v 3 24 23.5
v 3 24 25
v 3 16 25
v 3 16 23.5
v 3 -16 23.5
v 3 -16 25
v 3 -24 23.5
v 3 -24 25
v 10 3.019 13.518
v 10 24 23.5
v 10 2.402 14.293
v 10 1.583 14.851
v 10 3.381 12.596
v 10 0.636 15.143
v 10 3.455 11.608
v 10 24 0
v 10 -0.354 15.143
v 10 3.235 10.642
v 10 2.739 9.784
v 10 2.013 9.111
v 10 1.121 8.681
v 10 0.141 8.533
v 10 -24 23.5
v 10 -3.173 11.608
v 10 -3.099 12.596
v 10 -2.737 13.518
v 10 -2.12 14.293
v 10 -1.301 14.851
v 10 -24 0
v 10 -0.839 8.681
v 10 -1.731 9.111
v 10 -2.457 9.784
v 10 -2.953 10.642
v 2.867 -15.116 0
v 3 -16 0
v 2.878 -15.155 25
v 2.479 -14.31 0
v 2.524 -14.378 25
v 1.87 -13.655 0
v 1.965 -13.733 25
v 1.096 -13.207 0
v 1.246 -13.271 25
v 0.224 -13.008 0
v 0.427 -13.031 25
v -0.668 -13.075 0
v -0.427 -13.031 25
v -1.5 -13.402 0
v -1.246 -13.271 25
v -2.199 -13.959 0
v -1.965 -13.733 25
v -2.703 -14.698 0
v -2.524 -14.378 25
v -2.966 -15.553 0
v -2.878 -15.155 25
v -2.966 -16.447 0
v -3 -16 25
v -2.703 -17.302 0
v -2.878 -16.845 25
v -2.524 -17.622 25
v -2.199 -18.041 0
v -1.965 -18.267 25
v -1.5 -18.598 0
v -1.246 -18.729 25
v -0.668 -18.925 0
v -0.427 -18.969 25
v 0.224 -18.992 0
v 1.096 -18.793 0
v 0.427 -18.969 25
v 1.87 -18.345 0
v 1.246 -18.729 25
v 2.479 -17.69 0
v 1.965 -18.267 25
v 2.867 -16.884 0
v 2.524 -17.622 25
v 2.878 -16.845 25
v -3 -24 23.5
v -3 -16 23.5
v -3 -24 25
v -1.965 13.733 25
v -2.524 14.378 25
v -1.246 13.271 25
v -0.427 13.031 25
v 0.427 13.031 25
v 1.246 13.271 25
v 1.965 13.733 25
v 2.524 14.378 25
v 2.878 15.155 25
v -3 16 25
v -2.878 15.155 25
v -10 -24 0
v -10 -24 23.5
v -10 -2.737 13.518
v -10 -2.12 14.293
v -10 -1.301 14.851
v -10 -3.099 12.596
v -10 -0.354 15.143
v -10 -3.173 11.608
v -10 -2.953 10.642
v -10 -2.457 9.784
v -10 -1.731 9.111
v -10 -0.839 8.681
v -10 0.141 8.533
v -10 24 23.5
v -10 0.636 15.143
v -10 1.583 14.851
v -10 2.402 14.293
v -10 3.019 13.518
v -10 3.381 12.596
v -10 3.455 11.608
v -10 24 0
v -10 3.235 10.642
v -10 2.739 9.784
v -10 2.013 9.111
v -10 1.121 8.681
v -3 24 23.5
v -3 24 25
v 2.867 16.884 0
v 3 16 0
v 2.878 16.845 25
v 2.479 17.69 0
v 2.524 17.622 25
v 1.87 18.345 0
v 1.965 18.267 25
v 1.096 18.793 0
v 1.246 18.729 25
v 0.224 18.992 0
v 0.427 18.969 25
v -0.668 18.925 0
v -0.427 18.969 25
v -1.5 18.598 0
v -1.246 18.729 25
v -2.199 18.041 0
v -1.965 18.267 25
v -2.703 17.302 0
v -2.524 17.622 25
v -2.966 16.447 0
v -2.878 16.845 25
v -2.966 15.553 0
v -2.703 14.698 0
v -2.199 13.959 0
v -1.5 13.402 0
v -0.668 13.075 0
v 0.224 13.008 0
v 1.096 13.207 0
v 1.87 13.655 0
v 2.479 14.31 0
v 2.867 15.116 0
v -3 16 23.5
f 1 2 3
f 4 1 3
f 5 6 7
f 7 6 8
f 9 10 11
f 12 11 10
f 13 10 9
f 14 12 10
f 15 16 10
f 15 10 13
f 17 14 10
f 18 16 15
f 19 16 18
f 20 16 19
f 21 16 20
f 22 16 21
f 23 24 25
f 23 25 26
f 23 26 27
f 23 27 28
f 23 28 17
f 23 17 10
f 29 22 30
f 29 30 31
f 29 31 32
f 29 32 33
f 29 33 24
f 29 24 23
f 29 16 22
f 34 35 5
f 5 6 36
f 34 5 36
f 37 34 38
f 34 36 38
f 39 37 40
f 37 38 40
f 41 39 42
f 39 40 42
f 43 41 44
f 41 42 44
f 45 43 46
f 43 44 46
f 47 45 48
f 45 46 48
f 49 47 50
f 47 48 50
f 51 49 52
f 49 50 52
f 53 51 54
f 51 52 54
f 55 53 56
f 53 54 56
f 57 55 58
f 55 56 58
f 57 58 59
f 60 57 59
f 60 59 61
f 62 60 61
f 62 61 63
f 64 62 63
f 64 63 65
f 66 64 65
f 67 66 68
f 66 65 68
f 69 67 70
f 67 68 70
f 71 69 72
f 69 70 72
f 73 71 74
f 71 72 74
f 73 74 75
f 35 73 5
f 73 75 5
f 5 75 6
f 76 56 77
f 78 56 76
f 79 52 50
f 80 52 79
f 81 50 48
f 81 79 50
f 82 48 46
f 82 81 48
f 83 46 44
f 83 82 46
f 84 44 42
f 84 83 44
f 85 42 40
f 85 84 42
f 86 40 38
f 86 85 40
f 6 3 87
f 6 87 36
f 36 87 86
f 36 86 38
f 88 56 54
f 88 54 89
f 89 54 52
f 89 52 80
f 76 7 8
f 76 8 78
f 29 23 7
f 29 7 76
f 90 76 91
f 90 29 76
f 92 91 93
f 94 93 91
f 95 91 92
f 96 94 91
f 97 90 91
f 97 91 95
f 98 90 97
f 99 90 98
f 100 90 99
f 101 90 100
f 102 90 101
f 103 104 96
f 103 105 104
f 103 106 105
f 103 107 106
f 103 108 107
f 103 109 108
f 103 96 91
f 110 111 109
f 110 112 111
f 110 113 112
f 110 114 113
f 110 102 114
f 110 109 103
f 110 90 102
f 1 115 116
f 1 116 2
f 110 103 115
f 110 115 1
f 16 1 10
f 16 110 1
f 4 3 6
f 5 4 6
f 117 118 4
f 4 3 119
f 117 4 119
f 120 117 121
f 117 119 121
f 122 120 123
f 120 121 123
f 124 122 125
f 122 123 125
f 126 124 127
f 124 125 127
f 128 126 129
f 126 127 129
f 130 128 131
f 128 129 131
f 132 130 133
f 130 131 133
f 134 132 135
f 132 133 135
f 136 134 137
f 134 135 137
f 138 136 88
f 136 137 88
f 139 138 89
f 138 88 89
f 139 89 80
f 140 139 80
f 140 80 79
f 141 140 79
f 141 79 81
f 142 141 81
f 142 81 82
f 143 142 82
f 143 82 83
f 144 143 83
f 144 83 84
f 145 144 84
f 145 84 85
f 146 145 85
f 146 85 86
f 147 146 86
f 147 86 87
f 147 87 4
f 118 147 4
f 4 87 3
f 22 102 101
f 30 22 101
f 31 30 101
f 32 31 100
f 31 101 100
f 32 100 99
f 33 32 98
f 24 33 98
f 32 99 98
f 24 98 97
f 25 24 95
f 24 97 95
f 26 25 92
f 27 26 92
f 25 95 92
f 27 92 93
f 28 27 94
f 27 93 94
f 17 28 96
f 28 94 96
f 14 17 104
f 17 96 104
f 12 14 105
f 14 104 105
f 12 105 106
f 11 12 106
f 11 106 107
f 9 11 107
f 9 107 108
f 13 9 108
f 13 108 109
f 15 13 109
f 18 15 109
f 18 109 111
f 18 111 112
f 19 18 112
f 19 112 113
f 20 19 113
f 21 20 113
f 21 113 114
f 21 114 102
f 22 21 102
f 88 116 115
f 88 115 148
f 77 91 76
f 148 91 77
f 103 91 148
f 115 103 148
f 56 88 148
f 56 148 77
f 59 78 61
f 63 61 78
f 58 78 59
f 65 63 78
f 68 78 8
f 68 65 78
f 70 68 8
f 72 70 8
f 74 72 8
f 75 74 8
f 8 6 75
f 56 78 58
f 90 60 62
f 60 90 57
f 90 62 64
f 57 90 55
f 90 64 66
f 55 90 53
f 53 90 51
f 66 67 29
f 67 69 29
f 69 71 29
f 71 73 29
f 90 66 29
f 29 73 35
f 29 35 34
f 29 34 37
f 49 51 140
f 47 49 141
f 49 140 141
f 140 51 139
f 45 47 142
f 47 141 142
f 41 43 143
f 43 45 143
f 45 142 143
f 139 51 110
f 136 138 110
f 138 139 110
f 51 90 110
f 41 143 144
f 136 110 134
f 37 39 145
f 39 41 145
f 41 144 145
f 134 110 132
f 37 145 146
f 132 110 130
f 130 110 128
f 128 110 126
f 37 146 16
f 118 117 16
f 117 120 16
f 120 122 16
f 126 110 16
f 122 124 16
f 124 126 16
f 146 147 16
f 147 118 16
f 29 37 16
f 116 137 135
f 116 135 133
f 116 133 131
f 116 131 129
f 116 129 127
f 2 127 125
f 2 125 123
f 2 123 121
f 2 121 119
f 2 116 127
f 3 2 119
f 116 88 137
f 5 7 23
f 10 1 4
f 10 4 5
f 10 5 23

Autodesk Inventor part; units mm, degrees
ref_plane "YZ Plane" through (0, 0, 0) normal (1, 0, 0) x (0, 1, 0)
ref_plane "XZ Plane" through (0, 0, 0) normal (0, 1, 0) x (-1, 0, 0)
ref_plane "XY Plane" through (0, 0, 0) normal (0, 0, 1) x (1, 0, 0)
sketch "Sketch1" plane through (0, 0, 0) normal (0, 0, 1) x (1, 0, 0)
  line L0 (0, 33.6) -> (0, -33.6) projected
  line L1 (-14, 0) -> (14, 0) projected
  line L2 (-10, 24) -> (10, 24)
  line L3 (10, 24) -> (10, -24)
  line L4 (10, -24) -> (-10, -24)
  line L5 (-10, -24) -> (-10, 24)
  point P0 (0, 0)
  dimension "d0" = 20
  dimension "d1" = 48
extrude "Extrusion1" add sketch "Sketch1" along normal blind 25
sketch "Sketch2" plane through (0, 0, 25) normal (0, 0, 1) x (1, 0, 0)
  line L0 (-10, -24) -> (10, -24) projected
  line L1 (10, -24) -> (10, 24) projected
  line L2 (10, 24) -> (-10, 24) projected
  line L3 (-10, 24) -> (-10, -24) projected
  line L4 (0, 47.04) -> (0, -47.04) projected
  line L5 (3, 33.6) -> (3, -33.6)
  line L6 (-3, 33.6) -> (-3, -33.6)
  point P0 (0, 0)
  point P1 (3, 24)
  point P2 (3, -24)
  point P3 (-3, -24)
  point P4 (-3, 24)
  dimension "d4" = 3
  dimension "d5" = 3
extrude "Extrusion2" cut sketch "Sketch2" against normal blind 1.5 contours L3 L2 L6 L0 | L5 L2 L1 L0
sketch "Sketch3" plane through (10, -24, 0) normal (1, 0, 0) x (0, 0, -1)
  line L0 (-30, 24) -> (5, 24) projected
  line L1 (-23.5, 48) -> (-23.5, 0) projected
  line L2 (0, 0) -> (-23.5, 0) projected
  line L3 (0, 0) -> (0, 48) projected
  line L4 (0, 48) -> (-23.5, 48) projected
  line L5 (-25, 0) -> (-25, 48) projected
  line L6 (-23.5, 0) -> (-25, 0) projected
  line L7 (-23.5, 0) -> (-23.5, 48) projected
  line L8 (-25, 48) -> (-23.5, 48) projected
  line L9 (0, 0) -> (-23.5, 0) projected
  line L10 (-11.75, 0) -> (-11.75, 48)
  line L11 (0, 48) -> (-23.5, 48) projected
  point P0 (0, 24)
sketch "Sketch4" plane through (10, -24, 0) normal (1, 0, 0) x (0, 0, -1)
  point P0 (0, 24)
  point P1 (-11.8566, 24.141)
hole "Hole1" at (10, 0.141, 11.8566) direction (-1, 0, 0) diameter 6.647 end through all thread size "M8x1.25" class "6H" standard "ISO Metric profile"
sketch "Sketch5" plane through (0, 0, 25) normal (0, 0, 1) x (1, 0, 0)
  line L0 (3, -24) -> (3, 24) projected
  line L1 (3, 24) -> (-3, 24) projected
  line L2 (-3, 24) -> (-3, -24) projected
  line L3 (-3, -24) -> (3, -24) projected
  circle A0 centre (0, 16) radius 3
  circle A1 centre (0, -16) radius 3
  line L4 (0, 33.6) -> (0, -33.6) projected
  point P0 (0, 0)
  dimension "d15" = 6
  dimension "d16" = 6
  dimension "d17" = 8
  dimension "d18" = 8
extrude "Extrusion3" cut sketch "Sketch5" against normal through all contours A1 L4 | A0 L4 | L4 A1 | L4 A0
properties part number "elbow clamp"
